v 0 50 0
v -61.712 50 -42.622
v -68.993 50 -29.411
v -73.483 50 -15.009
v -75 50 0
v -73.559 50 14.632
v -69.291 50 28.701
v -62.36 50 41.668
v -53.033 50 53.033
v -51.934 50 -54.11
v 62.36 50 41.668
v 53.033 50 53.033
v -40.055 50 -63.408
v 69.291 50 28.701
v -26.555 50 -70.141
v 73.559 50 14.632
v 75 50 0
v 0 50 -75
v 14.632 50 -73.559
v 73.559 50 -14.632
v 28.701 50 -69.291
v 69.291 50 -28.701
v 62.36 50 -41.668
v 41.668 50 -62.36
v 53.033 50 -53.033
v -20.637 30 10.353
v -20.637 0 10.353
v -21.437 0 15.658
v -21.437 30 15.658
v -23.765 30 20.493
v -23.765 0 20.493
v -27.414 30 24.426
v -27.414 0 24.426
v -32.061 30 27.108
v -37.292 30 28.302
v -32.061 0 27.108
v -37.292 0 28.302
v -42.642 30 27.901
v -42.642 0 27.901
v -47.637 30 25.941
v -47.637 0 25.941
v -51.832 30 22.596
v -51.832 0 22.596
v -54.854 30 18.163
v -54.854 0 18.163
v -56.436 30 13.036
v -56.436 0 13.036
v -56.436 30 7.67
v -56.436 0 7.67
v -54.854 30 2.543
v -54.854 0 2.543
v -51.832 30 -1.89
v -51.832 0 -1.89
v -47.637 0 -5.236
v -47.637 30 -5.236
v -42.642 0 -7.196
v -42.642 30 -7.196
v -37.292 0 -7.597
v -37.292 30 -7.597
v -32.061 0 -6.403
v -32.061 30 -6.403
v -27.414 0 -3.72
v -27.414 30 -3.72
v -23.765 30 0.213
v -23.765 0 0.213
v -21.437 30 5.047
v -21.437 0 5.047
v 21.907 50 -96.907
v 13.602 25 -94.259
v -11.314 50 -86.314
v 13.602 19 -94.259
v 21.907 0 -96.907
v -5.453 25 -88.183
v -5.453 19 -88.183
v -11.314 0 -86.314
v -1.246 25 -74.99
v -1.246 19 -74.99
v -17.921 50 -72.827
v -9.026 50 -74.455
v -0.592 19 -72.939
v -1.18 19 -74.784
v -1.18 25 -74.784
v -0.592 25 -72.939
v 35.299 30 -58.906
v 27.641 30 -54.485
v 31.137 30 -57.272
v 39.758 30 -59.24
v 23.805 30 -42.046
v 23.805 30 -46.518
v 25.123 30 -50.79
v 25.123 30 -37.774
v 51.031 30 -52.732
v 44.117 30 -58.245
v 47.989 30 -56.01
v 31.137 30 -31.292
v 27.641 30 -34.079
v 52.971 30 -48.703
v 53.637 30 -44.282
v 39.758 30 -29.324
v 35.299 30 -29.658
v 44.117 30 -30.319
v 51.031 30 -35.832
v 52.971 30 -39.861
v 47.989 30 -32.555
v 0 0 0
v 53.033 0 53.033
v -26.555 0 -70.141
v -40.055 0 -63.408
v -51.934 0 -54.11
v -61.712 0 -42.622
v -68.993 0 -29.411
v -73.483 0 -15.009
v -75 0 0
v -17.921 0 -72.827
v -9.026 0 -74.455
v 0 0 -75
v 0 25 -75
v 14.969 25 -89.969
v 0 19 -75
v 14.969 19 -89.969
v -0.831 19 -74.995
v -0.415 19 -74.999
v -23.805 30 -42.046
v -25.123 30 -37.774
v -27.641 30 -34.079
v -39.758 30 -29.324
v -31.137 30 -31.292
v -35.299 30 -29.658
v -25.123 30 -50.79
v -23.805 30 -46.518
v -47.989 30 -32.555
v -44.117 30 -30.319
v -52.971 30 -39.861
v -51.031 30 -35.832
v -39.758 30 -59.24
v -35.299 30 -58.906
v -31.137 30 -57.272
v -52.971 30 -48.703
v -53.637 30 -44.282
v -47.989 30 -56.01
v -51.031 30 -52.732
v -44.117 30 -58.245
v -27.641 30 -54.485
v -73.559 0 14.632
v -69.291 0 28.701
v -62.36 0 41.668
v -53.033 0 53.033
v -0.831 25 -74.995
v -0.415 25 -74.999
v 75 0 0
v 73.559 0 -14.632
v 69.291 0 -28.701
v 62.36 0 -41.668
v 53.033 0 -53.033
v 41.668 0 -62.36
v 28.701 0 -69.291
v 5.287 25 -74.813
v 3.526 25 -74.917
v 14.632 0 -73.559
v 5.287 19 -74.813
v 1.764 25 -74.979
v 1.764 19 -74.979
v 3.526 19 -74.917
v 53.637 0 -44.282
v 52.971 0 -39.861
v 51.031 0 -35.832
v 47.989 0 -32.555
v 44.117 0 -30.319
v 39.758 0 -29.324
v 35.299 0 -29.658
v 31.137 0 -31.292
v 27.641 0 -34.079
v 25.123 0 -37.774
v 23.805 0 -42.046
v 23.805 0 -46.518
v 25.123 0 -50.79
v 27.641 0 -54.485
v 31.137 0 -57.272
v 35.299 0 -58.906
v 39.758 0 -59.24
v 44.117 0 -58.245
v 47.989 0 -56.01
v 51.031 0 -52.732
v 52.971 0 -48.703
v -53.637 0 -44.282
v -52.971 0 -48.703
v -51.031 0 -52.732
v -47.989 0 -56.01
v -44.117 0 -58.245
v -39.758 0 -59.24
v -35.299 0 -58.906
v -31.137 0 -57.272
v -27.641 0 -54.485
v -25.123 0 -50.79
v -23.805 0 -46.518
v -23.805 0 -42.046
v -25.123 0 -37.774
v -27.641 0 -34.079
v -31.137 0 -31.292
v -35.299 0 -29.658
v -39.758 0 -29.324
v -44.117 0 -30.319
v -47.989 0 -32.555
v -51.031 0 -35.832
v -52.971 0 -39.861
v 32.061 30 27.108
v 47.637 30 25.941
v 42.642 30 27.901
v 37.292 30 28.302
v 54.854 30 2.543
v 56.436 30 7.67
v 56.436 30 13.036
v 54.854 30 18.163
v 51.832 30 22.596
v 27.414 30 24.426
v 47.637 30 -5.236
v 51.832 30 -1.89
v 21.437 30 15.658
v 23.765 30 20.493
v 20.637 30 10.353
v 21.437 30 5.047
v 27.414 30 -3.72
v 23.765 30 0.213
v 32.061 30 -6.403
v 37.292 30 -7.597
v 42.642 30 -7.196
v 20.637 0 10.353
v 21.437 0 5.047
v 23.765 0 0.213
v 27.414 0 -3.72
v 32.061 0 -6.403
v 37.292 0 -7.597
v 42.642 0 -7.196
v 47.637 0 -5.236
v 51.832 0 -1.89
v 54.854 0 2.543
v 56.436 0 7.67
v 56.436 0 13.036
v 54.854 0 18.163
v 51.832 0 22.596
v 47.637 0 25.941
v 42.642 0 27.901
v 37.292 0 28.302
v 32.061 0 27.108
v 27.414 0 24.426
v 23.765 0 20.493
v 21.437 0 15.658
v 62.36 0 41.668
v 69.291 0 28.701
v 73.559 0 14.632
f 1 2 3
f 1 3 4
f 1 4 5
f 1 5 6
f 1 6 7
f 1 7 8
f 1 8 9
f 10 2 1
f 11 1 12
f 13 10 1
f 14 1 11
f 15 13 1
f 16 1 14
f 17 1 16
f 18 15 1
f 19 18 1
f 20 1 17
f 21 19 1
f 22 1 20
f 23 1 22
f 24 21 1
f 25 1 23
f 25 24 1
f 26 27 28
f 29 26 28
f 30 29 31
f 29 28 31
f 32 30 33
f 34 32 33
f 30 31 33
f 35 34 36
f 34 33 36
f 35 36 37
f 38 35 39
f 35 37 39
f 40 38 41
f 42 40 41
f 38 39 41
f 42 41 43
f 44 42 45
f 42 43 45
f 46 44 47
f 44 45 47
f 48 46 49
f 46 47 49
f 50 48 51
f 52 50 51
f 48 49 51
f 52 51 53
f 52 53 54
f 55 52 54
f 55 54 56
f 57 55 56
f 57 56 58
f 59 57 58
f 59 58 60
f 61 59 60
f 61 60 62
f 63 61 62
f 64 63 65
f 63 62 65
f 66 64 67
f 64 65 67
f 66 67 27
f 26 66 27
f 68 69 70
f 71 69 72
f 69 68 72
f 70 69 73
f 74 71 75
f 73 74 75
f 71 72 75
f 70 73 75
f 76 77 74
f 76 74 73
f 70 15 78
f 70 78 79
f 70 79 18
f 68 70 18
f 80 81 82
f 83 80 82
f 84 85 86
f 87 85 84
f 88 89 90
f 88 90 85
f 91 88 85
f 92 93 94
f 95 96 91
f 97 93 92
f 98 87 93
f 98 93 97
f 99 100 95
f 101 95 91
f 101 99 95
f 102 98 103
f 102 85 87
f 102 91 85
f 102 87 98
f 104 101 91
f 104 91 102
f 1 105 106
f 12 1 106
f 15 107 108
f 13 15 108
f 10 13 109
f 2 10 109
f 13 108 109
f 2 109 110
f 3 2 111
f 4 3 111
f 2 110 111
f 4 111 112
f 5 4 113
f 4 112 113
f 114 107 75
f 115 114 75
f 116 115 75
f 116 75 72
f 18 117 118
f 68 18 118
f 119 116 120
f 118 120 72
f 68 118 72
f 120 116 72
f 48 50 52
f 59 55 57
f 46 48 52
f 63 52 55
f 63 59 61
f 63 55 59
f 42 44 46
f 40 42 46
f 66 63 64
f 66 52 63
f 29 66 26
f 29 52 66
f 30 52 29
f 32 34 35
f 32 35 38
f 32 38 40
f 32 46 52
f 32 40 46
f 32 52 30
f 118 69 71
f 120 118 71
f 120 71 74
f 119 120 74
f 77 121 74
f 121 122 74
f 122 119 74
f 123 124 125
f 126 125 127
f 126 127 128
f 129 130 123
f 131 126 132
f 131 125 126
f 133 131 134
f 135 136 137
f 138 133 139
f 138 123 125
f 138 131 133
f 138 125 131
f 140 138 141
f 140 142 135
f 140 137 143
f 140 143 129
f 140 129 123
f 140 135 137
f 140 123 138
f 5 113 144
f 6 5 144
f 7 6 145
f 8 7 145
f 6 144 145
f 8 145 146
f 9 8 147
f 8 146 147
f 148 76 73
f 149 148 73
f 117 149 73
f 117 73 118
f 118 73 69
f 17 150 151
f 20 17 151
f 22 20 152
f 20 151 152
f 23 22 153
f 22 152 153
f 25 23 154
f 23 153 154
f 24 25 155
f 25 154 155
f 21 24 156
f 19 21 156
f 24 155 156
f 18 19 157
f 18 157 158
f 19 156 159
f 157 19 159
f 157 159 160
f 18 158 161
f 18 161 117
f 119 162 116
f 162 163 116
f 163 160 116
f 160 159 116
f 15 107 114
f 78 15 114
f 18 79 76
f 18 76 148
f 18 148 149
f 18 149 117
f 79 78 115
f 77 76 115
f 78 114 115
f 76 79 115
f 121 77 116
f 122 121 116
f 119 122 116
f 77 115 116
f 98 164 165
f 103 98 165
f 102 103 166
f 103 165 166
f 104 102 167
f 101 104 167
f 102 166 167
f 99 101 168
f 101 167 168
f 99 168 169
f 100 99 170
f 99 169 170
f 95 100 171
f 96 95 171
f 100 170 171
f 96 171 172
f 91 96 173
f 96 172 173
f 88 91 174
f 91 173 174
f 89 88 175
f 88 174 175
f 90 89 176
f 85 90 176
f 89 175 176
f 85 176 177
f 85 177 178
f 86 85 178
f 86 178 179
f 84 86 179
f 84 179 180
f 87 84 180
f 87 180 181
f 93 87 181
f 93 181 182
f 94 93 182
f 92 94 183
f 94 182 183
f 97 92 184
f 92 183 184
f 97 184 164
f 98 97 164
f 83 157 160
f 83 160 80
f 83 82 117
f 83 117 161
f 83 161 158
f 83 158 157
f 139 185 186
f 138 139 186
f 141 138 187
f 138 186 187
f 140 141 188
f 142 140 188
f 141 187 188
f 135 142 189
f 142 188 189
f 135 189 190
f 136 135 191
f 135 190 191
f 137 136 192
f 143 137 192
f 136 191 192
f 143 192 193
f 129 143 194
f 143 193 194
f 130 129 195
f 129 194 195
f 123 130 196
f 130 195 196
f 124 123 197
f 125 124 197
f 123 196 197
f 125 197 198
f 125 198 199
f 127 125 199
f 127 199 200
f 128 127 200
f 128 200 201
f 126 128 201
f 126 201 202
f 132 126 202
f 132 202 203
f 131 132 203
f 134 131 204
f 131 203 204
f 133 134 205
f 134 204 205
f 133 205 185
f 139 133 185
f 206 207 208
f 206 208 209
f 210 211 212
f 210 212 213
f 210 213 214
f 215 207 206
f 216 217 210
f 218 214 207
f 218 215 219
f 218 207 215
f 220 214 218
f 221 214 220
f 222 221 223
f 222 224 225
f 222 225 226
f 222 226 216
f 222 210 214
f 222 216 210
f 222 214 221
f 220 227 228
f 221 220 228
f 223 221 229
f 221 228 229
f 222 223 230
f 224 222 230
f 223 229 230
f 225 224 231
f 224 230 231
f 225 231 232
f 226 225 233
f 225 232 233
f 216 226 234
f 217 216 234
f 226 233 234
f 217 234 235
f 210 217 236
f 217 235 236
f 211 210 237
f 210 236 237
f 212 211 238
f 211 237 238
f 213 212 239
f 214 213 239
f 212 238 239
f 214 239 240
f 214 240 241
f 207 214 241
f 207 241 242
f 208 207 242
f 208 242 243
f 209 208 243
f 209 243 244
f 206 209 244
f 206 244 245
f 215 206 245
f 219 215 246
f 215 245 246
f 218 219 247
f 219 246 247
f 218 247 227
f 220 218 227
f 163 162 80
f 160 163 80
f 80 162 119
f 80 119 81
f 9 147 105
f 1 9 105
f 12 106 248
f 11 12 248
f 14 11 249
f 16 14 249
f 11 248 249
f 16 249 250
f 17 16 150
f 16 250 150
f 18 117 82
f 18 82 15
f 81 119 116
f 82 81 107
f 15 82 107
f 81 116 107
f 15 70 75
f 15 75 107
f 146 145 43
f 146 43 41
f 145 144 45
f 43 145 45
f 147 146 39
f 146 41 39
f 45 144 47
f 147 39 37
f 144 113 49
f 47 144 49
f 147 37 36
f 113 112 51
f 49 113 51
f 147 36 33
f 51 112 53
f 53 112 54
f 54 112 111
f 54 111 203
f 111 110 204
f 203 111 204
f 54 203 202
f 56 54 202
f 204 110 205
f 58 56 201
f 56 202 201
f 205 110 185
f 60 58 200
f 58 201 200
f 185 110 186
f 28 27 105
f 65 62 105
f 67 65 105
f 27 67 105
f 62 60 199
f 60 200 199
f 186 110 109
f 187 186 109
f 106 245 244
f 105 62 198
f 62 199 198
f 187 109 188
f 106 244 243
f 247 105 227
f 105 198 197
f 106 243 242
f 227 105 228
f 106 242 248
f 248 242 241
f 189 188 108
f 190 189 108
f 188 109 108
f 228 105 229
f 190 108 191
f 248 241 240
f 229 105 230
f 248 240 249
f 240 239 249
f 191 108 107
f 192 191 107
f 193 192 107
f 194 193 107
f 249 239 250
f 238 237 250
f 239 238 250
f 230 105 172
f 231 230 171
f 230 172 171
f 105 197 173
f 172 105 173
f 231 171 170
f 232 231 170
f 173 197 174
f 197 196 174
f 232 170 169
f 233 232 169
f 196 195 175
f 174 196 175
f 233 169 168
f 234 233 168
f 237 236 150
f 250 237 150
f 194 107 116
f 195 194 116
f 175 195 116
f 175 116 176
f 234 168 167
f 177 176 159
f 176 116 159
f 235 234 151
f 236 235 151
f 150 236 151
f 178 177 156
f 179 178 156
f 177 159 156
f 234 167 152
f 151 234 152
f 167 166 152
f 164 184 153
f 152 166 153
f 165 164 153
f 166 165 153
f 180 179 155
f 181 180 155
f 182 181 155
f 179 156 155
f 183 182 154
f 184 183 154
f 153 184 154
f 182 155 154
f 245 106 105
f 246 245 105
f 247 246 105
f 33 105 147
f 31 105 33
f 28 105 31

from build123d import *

# Parameters (mm, degrees)
BOSS_EXTRUDE2_DEPTH = 50
CUT_EXTRUDE1_DEPTH  = 16
SKETCH3_R           = 18
CUT_EXTRUDE2_DEPTH  = 30
SKETCH4_R           = 18
CUT_EXTRUDE3_DEPTH  = 30
SKETCH7_R           = 15
CUT_EXTRUDE4_DEPTH  = 30
SKETCH9_R           = 15
CUT_EXTRUDE5_DEPTH  = 30


with BuildPart() as part:
    # Sketch1 → Boss-Extrude2 (new body)
    with BuildSketch(Plane(origin=(0, 0, 0), x_dir=(1, 0, 0), z_dir=(0, 1, 0))):
        with BuildLine():
            Line((0, 75), (0, 0))
            Line((0, 0), (53.033008589, -53.033008589))
            ThreePointArc((53.033008589, -53.033008589), (69.290964938, -28.701257427), (75, 0))
            ThreePointArc((75, 0), (53.033008589, 53.033008589), (0, 75))
        make_face()
        with BuildLine():
            Line((-53.033008589, -53.033008589), (0, 0))
            Line((0, 0), (0, 75))
            Line((0, 75), (-75, 0))
            ThreePointArc((-75, 0), (-69.290964938, -28.701257427), (-53.033008589, -53.033008589))
        make_face()
        with BuildLine():
            Line((-75, 0), (0, 75))
            Line((0, 75), (-26.555455015, 70.141341654))
            ThreePointArc((-26.555455015, 70.141341654), (-61.711664724, 42.622417071), (-75, 0))
        make_face()
        with BuildLine():
            ThreePointArc((-26.555455015, 70.141341654), (-13.498136464, 73.775336746), (0, 75))
            Line((0, 75), (-11.313708499, 86.313708499))
            Line((-11.313708499, 86.313708499), (-26.555455015, 70.141341654))
        make_face()
        Polygon((0, 75), (21.906905273, 96.906905273), (-11.313708499, 86.313708499), align=None)
    extrude(amount=BOSS_EXTRUDE2_DEPTH)

    # Sketch2 → Cut-Extrude1 (cut)
    with BuildSketch(Plane(origin=(-26.027142022, 0, -81.621974096), x_dir=(-0.952734996, 0, 0.303802613), z_dir=(-0.303802613, 0, -0.952734996))):
        Polygon((-32.87770529, 25), (-41.594875837, 25), (-41.594875837, 19), (-21.594875837, 19), (-21.594875837, 25), align=None)
    extrude(amount=-CUT_EXTRUDE1_DEPTH, mode=Mode.SUBTRACT)

    # Sketch3 → Cut-Extrude2 (cut)
    with BuildSketch(Plane.XZ):
        with Locations((-38.637033052, 10.352761804)):
            Circle(SKETCH3_R)
    extrude(amount=-CUT_EXTRUDE2_DEPTH, mode=Mode.SUBTRACT)

    # Sketch4 → Cut-Extrude3 (cut)
    with BuildSketch(Plane(origin=(0, 0, 0), x_dir=(-1, 0, 0), z_dir=(0, -1, 0))):
        with Locations((-38.637033052, -10.352761804)):
            Circle(SKETCH4_R)
    extrude(amount=-CUT_EXTRUDE3_DEPTH, mode=Mode.SUBTRACT)

    # Sketch7 → Cut-Extrude4 (cut)
    with BuildSketch(Plane(origin=(0, 0, 0), x_dir=(-1, 0, 0), z_dir=(0, -1, 0))):
        with Locations((38.637033052, 44.282032303)):
            Circle(SKETCH7_R)
    extrude(amount=-CUT_EXTRUDE4_DEPTH, mode=Mode.SUBTRACT)

    # Sketch9 → Cut-Extrude5 (cut)
    with BuildSketch(Plane.XZ):
        with Locations((38.637033052, -44.282032303)):
            Circle(SKETCH9_R)
    extrude(amount=-CUT_EXTRUDE5_DEPTH, mode=Mode.SUBTRACT)


solid = part.part
